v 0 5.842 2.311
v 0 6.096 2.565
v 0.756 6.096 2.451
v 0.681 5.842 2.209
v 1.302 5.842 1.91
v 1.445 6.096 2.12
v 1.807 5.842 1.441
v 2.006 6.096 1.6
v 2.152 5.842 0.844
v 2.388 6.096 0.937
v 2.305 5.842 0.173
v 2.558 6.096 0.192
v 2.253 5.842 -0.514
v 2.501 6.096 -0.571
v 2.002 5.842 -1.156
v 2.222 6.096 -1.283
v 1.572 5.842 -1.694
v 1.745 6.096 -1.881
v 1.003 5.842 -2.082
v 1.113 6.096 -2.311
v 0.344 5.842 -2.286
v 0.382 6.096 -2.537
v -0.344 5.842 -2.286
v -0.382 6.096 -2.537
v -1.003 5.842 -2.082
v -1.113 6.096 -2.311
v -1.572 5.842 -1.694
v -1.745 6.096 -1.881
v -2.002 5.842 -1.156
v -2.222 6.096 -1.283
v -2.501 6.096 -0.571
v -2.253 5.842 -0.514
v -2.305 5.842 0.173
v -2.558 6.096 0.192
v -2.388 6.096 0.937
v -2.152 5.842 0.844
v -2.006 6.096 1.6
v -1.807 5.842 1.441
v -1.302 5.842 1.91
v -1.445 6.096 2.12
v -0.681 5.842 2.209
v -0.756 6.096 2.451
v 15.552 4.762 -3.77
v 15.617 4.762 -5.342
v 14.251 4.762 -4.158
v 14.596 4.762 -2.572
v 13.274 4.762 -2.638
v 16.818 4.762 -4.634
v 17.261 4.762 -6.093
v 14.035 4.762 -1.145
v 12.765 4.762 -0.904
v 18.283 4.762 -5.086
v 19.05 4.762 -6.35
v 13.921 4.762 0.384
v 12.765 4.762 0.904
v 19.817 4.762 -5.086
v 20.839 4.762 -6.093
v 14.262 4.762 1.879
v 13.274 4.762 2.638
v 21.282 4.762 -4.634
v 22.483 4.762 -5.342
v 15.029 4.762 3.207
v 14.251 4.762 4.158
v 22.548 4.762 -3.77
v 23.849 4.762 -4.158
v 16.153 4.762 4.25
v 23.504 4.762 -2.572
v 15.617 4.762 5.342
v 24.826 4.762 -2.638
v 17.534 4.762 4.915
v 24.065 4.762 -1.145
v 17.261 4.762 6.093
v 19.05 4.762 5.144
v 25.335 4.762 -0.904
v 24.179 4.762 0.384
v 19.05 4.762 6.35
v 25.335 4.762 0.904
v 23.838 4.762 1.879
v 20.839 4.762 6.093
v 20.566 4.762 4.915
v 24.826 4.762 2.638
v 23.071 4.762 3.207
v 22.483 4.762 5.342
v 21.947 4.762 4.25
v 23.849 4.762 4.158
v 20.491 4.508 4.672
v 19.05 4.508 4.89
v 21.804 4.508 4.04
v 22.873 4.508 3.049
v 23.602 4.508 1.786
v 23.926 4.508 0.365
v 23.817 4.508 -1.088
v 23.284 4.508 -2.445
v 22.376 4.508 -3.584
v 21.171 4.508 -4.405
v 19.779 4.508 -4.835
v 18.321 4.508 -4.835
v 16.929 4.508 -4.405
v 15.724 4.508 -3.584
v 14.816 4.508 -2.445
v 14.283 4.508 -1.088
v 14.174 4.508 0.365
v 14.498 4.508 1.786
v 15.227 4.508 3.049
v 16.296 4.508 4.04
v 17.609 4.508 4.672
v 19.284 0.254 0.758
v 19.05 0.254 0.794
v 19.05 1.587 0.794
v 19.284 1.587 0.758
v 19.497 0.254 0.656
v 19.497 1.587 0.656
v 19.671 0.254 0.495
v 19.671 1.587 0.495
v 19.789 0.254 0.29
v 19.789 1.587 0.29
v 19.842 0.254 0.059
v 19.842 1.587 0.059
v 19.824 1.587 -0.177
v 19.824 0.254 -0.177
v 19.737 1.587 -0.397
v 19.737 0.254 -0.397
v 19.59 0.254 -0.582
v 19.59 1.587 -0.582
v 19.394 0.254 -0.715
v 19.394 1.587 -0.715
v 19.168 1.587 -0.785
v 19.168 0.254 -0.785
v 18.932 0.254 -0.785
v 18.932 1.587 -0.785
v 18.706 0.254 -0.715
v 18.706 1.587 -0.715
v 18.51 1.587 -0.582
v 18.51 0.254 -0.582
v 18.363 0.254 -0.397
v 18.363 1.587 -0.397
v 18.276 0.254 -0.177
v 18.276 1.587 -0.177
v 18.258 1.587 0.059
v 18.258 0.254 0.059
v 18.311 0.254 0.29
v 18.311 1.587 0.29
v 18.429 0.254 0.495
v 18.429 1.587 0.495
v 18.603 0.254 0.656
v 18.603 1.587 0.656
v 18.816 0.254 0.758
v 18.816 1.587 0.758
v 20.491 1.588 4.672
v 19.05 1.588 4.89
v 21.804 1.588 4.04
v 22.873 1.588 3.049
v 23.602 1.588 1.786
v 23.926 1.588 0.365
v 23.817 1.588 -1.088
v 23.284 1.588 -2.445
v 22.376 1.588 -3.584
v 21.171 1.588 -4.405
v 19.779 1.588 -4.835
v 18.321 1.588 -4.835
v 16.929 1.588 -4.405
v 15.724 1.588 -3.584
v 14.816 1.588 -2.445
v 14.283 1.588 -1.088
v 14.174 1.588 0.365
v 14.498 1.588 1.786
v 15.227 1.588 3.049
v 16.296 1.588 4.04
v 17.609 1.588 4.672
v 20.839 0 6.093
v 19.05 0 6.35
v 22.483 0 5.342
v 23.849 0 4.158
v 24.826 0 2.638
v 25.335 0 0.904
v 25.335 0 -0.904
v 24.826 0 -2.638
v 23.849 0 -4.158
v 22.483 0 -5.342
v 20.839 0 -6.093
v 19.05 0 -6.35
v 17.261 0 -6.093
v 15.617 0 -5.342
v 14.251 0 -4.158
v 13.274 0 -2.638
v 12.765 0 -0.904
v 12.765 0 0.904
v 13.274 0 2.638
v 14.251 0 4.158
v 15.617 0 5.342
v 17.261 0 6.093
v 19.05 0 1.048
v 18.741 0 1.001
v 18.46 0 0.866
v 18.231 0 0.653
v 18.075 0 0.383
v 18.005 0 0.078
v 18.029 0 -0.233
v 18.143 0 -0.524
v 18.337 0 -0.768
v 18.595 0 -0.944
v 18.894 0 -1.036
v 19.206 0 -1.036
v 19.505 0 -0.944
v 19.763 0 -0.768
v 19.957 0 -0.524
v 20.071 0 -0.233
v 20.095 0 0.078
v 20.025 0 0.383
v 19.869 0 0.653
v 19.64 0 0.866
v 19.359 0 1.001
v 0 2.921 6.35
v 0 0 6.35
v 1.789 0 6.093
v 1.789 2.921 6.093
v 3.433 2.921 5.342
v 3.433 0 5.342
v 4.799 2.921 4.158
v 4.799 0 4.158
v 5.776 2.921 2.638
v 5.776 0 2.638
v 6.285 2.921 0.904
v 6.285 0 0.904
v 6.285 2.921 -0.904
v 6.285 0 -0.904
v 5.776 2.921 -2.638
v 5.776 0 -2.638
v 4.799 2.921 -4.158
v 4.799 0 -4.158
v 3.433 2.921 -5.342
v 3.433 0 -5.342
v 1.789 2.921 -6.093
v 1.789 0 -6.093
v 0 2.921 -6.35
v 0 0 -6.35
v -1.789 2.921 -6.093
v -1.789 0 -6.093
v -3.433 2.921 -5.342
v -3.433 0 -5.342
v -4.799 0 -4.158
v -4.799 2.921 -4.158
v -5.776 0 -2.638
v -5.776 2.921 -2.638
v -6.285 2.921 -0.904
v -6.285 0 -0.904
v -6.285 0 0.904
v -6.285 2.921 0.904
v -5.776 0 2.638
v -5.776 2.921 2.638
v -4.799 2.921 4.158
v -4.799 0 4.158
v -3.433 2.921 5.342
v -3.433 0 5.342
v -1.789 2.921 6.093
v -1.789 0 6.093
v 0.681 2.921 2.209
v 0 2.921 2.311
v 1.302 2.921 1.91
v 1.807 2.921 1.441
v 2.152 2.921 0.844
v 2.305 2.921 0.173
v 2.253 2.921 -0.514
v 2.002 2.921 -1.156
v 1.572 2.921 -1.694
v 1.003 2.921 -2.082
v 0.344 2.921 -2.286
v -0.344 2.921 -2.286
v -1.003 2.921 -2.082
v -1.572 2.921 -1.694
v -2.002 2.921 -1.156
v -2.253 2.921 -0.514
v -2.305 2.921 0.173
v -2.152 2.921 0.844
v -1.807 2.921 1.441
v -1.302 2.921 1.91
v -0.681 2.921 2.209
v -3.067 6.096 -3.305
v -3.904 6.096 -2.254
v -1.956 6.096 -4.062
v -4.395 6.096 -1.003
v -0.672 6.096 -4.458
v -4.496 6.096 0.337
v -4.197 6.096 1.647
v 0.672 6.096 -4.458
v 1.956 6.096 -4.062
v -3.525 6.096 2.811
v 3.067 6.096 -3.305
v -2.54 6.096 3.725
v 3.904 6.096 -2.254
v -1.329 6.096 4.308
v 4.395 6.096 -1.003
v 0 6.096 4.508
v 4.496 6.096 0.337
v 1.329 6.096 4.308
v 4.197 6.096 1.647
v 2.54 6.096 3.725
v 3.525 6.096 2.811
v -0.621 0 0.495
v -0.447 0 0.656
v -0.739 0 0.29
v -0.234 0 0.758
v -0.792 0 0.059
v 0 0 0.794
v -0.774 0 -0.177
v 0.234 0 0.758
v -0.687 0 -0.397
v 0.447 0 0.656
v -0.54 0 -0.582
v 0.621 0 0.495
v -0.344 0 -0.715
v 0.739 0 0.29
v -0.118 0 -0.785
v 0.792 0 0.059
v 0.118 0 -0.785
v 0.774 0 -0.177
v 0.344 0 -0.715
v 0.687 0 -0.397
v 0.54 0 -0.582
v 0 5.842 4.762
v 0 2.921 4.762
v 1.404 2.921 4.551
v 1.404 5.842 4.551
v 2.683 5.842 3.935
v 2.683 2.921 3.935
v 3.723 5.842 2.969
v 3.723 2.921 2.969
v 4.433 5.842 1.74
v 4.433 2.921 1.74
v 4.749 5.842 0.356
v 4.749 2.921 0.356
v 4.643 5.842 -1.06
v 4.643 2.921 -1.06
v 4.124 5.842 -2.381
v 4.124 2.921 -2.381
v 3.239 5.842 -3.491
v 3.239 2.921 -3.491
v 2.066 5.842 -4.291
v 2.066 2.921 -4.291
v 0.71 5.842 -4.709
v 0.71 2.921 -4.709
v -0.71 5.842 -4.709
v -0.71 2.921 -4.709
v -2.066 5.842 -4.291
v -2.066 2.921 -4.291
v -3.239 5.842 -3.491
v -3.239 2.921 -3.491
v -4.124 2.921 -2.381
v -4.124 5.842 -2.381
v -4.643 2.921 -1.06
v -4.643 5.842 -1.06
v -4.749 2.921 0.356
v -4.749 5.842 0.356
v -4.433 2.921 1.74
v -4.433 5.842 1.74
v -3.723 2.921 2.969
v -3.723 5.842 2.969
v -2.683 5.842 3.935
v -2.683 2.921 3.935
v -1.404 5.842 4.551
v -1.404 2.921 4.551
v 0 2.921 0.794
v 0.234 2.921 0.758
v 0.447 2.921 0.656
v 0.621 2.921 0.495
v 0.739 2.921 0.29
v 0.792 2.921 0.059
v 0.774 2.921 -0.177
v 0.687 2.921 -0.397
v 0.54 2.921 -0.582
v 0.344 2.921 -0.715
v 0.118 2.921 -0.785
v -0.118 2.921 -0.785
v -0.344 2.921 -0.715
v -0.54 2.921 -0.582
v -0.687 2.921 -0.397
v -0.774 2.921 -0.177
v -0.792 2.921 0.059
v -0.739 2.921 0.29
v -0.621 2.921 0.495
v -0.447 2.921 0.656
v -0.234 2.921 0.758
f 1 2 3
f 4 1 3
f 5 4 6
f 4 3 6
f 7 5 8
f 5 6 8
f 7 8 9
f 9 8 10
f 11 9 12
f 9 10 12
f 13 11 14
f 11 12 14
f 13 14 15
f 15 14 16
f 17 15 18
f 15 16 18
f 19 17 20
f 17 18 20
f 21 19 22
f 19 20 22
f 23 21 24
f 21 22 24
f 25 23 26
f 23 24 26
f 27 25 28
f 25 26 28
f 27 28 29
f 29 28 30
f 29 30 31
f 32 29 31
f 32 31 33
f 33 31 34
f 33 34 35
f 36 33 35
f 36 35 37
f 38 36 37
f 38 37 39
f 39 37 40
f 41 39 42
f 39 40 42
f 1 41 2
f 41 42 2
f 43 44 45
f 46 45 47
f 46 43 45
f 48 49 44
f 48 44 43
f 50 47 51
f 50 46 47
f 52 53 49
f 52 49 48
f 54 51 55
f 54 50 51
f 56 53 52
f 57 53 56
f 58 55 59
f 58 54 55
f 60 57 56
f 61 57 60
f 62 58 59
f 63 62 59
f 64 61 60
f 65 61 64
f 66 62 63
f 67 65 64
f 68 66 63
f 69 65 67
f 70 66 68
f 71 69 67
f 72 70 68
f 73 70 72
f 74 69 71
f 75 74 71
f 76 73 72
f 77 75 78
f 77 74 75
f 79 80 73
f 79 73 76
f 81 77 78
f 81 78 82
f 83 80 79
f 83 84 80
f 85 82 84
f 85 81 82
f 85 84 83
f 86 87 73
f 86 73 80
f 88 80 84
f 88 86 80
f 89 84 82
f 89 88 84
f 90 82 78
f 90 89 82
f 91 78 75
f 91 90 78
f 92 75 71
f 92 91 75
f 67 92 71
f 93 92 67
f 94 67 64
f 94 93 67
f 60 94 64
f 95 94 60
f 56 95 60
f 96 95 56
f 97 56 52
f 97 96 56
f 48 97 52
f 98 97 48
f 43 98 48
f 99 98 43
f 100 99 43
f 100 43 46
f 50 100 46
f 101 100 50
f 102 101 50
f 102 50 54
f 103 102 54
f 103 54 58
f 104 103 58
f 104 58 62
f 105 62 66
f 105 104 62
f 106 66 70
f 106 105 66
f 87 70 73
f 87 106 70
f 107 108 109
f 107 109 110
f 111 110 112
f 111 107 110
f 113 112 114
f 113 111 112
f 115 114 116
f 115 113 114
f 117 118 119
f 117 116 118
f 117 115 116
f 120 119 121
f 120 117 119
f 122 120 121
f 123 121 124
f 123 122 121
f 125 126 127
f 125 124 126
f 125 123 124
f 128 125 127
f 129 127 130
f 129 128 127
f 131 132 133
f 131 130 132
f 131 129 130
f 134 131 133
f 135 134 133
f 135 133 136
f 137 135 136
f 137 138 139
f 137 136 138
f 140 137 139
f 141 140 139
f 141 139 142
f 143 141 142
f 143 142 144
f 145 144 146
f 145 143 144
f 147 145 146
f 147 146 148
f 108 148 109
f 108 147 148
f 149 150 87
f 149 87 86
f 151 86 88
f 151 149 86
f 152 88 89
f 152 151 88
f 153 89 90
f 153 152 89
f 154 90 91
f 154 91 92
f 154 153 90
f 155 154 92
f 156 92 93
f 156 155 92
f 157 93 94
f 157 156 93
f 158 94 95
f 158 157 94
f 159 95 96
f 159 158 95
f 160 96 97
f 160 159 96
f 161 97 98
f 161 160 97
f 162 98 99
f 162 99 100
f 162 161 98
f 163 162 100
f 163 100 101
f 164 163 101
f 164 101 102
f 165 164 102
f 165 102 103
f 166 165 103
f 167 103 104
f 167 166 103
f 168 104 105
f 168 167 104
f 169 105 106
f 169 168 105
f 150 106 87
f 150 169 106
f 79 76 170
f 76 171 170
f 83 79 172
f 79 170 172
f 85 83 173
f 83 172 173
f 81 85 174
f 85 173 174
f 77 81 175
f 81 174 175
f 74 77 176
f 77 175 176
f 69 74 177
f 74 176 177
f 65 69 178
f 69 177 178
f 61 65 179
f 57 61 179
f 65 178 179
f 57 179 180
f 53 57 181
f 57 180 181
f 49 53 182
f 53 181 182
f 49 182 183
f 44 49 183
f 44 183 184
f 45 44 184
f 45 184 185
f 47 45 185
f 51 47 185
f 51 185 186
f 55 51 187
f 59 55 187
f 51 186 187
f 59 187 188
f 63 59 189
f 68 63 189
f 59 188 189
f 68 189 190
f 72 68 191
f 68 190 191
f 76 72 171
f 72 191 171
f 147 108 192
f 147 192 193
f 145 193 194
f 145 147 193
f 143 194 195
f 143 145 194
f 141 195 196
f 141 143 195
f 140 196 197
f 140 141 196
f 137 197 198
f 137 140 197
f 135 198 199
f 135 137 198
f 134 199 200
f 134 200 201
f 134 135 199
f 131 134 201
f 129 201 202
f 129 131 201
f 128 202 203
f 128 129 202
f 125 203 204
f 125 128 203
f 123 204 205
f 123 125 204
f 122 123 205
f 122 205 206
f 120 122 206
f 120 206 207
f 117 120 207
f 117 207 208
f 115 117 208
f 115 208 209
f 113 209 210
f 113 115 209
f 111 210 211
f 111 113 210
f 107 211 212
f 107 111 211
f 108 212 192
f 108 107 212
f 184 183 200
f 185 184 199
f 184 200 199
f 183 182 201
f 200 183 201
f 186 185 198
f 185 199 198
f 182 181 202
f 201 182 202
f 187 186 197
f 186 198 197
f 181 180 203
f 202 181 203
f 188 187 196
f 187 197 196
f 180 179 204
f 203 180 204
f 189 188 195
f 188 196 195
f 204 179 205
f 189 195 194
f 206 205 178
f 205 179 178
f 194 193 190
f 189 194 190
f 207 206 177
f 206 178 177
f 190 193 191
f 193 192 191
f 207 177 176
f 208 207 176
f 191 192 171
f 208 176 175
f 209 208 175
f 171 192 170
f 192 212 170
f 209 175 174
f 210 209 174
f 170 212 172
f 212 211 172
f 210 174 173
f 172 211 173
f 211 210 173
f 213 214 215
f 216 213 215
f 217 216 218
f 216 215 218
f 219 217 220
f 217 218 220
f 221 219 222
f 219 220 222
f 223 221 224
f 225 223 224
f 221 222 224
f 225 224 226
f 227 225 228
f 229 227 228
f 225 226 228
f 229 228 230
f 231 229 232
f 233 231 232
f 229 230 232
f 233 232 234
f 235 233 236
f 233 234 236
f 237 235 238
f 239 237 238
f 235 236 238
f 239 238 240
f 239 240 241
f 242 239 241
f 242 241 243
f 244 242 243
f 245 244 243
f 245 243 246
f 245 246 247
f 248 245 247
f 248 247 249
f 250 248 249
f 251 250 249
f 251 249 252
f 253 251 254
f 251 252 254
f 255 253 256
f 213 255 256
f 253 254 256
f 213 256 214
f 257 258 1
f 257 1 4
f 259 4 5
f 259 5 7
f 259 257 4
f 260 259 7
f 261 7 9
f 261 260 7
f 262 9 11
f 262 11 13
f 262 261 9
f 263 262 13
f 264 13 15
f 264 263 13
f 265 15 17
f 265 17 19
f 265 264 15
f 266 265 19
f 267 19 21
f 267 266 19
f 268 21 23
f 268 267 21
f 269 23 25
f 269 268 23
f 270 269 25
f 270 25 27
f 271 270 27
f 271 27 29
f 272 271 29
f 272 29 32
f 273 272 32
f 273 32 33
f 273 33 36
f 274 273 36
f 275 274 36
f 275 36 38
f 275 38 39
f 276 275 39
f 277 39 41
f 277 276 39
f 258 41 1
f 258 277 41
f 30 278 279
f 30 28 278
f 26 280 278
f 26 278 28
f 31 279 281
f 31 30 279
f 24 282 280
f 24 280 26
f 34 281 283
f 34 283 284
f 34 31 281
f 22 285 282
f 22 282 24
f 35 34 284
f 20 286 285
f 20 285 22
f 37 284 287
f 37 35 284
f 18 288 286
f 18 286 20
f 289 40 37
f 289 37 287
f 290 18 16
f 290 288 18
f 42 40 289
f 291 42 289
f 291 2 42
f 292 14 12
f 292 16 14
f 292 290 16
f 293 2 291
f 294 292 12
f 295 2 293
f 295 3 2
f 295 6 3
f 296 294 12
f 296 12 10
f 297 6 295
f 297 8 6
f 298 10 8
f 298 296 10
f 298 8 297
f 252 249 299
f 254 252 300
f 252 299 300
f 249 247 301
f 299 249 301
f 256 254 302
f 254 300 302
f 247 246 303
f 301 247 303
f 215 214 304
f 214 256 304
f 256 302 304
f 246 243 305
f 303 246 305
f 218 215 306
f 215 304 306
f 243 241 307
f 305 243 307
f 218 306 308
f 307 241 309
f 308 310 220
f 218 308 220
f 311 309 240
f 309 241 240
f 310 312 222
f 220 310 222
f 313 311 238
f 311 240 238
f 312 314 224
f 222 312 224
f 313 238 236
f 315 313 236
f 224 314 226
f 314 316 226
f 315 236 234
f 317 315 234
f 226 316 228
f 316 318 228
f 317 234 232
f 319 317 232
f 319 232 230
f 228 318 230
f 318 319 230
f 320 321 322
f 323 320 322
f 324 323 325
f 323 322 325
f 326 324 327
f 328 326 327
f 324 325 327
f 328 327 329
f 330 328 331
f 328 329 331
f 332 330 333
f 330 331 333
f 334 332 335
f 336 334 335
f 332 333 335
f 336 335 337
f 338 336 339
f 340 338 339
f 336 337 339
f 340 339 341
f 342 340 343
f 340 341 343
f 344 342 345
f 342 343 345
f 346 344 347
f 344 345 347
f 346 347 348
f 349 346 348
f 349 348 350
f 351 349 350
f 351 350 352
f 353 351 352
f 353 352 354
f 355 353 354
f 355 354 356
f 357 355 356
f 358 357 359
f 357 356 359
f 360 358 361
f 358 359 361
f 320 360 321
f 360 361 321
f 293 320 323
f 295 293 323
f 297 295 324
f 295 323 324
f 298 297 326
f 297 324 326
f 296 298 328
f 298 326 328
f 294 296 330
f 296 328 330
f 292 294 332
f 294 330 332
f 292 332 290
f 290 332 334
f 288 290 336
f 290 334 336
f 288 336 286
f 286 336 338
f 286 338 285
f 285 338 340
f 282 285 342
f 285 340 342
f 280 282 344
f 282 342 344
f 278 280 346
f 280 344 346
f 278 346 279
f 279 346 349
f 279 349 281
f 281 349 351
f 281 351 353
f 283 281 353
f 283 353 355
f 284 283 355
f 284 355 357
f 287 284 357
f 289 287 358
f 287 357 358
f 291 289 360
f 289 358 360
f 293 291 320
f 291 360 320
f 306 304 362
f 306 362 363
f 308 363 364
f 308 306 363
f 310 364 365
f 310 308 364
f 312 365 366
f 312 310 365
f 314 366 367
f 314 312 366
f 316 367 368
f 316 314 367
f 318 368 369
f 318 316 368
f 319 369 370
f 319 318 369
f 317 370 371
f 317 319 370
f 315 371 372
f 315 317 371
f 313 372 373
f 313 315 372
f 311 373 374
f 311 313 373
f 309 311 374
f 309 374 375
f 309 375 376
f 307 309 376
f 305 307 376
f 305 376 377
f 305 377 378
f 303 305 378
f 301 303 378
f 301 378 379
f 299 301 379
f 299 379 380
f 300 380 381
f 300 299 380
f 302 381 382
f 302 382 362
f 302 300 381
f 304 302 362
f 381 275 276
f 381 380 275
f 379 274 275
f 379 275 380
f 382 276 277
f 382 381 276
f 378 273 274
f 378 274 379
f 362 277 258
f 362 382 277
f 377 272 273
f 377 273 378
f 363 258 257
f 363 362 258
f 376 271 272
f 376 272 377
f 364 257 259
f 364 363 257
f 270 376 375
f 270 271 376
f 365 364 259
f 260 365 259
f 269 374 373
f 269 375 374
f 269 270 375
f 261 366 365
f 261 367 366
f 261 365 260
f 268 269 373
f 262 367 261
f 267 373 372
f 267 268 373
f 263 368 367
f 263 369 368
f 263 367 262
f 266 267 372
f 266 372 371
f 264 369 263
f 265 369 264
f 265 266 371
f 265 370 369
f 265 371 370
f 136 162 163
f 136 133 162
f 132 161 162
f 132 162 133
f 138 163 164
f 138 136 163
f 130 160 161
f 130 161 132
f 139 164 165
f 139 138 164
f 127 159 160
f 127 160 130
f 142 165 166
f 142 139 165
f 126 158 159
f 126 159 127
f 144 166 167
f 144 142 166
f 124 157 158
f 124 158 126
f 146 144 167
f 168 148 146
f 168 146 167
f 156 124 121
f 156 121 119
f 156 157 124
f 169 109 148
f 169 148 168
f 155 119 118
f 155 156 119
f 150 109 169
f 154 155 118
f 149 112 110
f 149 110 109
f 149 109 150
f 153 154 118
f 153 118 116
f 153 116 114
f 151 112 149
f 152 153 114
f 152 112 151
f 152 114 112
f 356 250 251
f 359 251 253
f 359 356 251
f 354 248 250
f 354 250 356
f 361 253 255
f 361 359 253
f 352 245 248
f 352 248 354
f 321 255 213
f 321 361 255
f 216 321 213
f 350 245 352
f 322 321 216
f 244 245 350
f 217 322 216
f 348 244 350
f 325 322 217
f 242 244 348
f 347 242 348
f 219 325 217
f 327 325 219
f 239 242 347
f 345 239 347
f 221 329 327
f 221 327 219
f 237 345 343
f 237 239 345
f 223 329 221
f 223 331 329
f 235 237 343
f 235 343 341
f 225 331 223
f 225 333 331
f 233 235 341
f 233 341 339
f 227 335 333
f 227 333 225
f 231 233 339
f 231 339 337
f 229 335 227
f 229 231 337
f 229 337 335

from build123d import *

# Parameters (mm, degrees)
SKETCH2_R               = 6.35
SKETCH2_R_2             = 4.7625
SKETCH2_R_3             = 2.3114
SKETCH2_R_4             = 0.79375
BOSS_EXTRUDE1_DEPTH     = 2.921
BOSS_EXTRUDE2_START     = 2.921
SKETCH2_3_R             = 4.7625
SKETCH2_3_R_2           = 2.3114
BOSS_EXTRUDE2_DEPTH     = 3.175
CHAMFER1_SIZE           = 0.254
SKETCH3_R               = 6.35
BOSS_EXTRUDE3_DEPTH     = 1.5875
BOSS_EXTRUDE4_START     = 1.5875
SKETCH3_3_R             = 6.35
SKETCH3_3_R_2           = 4.8895
BOSS_EXTRUDE4_DEPTH     = 3.175
CUT_EXTRUDE1_DEPTH      = 27.882033331
CUT_EXTRUDE1_DEPTH_BACK = 27.882033331
SKETCH3_4_R             = 0.79375
CHAMFER2_SIZE           = 0.254


with BuildPart() as part:
    # Sketch2 → Boss-Extrude1 (new body)
    # profile 1 of 3: a face of its own
    with BuildSketch(Plane(origin=(0, 0, 0), x_dir=(1, 0, 0), z_dir=(0, 1, 0))):
        with Locations(Location((0, 0, 0), (0, 0, 270))):
            Circle(SKETCH2_R)
        Circle(SKETCH2_R_2, mode=Mode.SUBTRACT)
    # profile 2 of 3: a face of its own
    with BuildSketch(Plane(origin=(0, 0, 0), x_dir=(1, 0, 0), z_dir=(0, 1, 0))):
        Circle(SKETCH2_R_2)
        Circle(SKETCH2_R_3, mode=Mode.SUBTRACT)
    # profile 3 of 3: a face of its own
    with BuildSketch(Plane(origin=(0, 0, 0), x_dir=(1, 0, 0), z_dir=(0, 1, 0))):
        Circle(SKETCH2_R_3)
        with Locations(Location((0, 0, 0), (0, 0, 270))):
            Circle(SKETCH2_R_4, mode=Mode.SUBTRACT)
    extrude(amount=BOSS_EXTRUDE1_DEPTH)

    # Sketch2<3> → Boss-Extrude2 (add)
    with BuildSketch(Plane(origin=(0, 0, 0), x_dir=(1, 0, 0), z_dir=(0, 1, 0)).offset(BOSS_EXTRUDE2_START)):
        with Locations(Location((0, 0, 0), (0, 0, 270))):
            Circle(SKETCH2_3_R)
        with Locations(Location((0, 0, 0), (0, 0, 270))):
            Circle(SKETCH2_3_R_2, mode=Mode.SUBTRACT)
    extrude(amount=BOSS_EXTRUDE2_DEPTH)

    # Chamfer1
    chamfer1_edges = [part.edges().sort_by_distance(p)[0] for p in [
        (0, 6.096, -4.7625),
        (0, 6.096, -2.3114),
    ]]
    chamfer(chamfer1_edges, length=CHAMFER1_SIZE)


with BuildPart() as body_2:
    # Sketch3 → Boss-Extrude3 (new body)
    with BuildSketch(Plane(origin=(0, 0, 0), x_dir=(1, 0, 0), z_dir=(0, 1, 0))):
        with Locations(Location((19.05, 0, 0), (0, 0, 270))):
            Circle(SKETCH3_R)
    extrude(amount=BOSS_EXTRUDE3_DEPTH)

    # Sketch3<3> → Boss-Extrude4 (add)
    with BuildSketch(Plane(origin=(0, 0, 0), x_dir=(1, 0, 0), z_dir=(0, 1, 0)).offset(BOSS_EXTRUDE4_START)):
        with Locations(Location((19.05, 0, 0), (0, 0, 270))):
            Circle(SKETCH3_3_R)
        with Locations(Location((19.05, 0, 0), (0, 0, 270))):
            Circle(SKETCH3_3_R_2, mode=Mode.SUBTRACT)
    extrude(amount=BOSS_EXTRUDE4_DEPTH)

    # Sketch3<4> → Cut-Extrude1 (cut, two sides: drawn at the far end of the back side and taken through both)
    with BuildSketch(Plane(origin=(0, 0, 0), x_dir=(1, 0, 0), z_dir=(0, 1, 0)).offset(-CUT_EXTRUDE1_DEPTH_BACK)):
        with Locations(Location((19.05, 0, 0), (0, 0, 270))):
            Circle(SKETCH3_4_R)
    extrude(amount=CUT_EXTRUDE1_DEPTH + CUT_EXTRUDE1_DEPTH_BACK, mode=Mode.SUBTRACT)

    # Chamfer2
    chamfer2_edges = [body_2.edges().sort_by_distance(p)[0] for p in [
        (19.05, 4.7625, -4.8895),
        (19.05, 0, -0.79375),
    ]]
    chamfer(chamfer2_edges, length=CHAMFER2_SIZE)


solid = Compound([part.part, body_2.part])
